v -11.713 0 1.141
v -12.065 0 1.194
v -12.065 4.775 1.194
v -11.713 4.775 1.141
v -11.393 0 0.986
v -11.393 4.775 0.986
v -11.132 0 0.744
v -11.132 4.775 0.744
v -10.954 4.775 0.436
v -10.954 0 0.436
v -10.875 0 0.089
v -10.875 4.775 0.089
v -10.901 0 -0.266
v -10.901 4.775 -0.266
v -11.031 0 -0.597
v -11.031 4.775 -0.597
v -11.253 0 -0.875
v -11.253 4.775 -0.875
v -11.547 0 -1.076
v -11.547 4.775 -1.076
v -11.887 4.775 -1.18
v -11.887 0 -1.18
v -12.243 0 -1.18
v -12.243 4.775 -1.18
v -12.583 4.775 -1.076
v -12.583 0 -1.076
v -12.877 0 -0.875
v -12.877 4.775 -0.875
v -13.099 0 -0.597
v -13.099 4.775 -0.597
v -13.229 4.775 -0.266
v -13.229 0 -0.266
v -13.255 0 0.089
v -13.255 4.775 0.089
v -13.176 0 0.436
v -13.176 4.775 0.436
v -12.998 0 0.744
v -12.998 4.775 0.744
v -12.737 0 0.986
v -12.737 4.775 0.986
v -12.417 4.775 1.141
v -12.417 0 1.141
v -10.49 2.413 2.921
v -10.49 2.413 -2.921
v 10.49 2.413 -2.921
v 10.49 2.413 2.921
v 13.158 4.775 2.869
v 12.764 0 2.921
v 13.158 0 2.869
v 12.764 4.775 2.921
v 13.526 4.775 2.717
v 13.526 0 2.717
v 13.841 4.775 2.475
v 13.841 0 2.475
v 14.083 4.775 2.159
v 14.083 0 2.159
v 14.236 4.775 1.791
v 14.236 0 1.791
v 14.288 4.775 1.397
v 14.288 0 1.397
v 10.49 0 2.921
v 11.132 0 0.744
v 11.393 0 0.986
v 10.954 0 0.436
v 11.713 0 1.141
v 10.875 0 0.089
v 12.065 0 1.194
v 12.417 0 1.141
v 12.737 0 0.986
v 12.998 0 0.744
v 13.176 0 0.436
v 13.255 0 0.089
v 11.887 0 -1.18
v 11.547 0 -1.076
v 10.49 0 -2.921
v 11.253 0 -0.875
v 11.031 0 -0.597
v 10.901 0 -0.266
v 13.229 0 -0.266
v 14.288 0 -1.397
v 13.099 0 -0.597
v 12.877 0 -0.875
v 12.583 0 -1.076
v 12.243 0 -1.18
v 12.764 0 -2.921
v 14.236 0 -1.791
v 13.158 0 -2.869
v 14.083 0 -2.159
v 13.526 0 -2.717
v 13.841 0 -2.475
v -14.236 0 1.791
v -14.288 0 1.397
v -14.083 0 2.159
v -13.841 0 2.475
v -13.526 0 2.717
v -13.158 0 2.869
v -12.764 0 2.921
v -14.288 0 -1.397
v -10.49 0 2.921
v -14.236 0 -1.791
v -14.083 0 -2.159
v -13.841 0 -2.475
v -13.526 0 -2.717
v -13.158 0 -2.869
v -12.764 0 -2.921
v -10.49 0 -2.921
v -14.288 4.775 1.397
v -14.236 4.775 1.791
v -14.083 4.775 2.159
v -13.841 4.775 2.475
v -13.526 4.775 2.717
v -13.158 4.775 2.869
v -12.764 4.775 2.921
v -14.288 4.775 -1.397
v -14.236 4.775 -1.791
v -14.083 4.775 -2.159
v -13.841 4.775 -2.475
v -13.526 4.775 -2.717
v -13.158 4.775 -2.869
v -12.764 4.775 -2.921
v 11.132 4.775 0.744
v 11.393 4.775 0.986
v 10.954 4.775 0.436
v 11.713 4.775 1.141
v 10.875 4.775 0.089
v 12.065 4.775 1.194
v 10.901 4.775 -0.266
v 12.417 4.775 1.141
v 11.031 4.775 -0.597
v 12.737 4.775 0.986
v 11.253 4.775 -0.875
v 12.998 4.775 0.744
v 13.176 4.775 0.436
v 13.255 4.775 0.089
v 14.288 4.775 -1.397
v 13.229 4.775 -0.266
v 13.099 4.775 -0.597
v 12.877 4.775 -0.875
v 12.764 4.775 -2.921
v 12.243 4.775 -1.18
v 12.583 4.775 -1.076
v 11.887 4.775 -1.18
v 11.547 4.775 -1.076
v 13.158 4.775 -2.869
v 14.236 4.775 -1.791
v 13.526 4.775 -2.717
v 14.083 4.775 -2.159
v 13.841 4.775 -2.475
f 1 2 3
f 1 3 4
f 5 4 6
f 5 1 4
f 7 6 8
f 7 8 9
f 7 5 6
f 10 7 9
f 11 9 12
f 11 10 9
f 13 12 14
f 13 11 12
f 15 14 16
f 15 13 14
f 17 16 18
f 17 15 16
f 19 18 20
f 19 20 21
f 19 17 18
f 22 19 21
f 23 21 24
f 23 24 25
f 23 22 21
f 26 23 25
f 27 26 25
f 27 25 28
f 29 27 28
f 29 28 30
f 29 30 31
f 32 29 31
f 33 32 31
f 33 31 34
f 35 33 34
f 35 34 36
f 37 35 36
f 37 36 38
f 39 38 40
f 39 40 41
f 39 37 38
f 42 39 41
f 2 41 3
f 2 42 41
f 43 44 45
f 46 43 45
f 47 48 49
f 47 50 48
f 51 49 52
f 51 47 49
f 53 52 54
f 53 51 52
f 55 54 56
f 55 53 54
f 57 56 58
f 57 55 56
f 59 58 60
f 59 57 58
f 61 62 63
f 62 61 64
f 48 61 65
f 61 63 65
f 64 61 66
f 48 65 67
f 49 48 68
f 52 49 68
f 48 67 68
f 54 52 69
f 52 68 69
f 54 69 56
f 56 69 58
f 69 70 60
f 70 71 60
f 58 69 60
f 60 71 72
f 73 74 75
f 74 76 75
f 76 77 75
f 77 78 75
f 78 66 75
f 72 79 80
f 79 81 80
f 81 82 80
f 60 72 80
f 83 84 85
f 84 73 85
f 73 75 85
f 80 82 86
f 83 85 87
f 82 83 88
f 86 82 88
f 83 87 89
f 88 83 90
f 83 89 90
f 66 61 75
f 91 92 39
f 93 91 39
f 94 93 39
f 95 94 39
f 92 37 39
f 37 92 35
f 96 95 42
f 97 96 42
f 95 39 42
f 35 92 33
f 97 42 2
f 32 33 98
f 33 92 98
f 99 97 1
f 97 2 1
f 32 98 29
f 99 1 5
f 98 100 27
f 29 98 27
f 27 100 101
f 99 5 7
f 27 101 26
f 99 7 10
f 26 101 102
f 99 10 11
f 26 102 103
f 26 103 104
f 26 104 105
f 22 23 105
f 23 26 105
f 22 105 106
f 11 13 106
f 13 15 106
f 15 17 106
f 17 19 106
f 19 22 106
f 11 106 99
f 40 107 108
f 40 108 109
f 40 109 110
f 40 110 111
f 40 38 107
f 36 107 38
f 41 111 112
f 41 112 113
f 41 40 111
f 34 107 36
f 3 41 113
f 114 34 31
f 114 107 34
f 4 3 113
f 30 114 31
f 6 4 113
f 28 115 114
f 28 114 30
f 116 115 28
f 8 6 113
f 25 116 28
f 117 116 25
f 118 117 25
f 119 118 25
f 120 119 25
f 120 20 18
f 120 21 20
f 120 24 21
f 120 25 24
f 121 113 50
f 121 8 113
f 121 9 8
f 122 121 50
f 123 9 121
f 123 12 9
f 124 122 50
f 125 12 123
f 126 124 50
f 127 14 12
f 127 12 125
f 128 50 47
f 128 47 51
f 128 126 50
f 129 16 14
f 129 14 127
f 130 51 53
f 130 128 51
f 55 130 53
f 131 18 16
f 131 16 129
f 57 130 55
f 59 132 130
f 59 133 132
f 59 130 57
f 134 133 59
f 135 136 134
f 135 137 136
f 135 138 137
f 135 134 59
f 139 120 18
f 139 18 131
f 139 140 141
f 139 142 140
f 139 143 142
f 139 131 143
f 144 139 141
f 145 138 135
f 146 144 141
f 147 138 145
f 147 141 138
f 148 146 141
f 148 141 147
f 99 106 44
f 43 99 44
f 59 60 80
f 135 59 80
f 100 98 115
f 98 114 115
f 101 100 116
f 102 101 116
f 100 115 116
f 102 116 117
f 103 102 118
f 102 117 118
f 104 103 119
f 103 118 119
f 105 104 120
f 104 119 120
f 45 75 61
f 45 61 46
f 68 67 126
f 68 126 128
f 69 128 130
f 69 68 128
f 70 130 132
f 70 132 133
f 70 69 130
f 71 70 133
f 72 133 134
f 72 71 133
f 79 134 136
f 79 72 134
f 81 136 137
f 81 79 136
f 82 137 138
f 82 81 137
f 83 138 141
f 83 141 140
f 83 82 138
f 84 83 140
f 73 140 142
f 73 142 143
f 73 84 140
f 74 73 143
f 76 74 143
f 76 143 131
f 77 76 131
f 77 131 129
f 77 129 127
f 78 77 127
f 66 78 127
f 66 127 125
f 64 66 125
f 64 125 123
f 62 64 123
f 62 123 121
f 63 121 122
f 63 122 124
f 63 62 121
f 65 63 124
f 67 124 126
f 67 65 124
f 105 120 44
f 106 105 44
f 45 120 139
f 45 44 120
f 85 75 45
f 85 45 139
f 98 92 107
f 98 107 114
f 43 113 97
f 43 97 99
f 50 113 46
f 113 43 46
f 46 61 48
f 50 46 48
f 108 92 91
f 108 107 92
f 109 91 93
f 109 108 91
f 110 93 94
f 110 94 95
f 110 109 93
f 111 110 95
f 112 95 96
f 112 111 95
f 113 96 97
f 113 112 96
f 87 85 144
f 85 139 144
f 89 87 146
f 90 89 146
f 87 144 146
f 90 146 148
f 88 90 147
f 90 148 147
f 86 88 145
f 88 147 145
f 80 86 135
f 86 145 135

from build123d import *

# Parameters (mm, degrees)
SKETCH1_W               = 28.575
SKETCH1_H               = 5.842
SKETCH1_R               = 1.1938
BOSS_EXTRUDE1_DEPTH     = 4.7752
FILLET1_R               = 1.524
CUT_EXTRUDE2_DEPTH      = 16.344948103
CUT_EXTRUDE2_DEPTH_BACK = 16.344948103
SKETCH3_W               = 20.9804
SKETCH3_H               = 2.413


with BuildPart() as part:
    # Sketch1 → Boss-Extrude1 (new body)
    with BuildSketch(Plane(origin=(0, 0, 0), x_dir=(1, 0, 0), z_dir=(0, 1, 0))):
        Rectangle(SKETCH1_W, SKETCH1_H)
        with Locations(Location((12.065, 0, 0), (0, 0, 270))):
            Circle(SKETCH1_R, mode=Mode.SUBTRACT)
        with Locations(Location((-12.065, 0, 0), (0, 0, 270))):
            Circle(SKETCH1_R, mode=Mode.SUBTRACT)
    extrude(amount=BOSS_EXTRUDE1_DEPTH)

    # Fillet1
    fillet1_edges = [part.edges().sort_by_distance(p)[0] for p in [
        (-14.2875, 2.3876, -2.921),
        (14.2875, 2.3876, -2.921),
        (14.2875, 2.3876, 2.921),
        (-14.2875, 2.3876, 2.921),
    ]]
    fillet(fillet1_edges, radius=FILLET1_R)

    # Sketch3 → Cut-Extrude2 (cut, two sides: drawn at the far end of the back side and taken through both)
    with BuildSketch(Plane.XY.offset(-CUT_EXTRUDE2_DEPTH_BACK)):
        with Locations((0, 1.2065)):
            Rectangle(SKETCH3_W, SKETCH3_H)
    extrude(amount=CUT_EXTRUDE2_DEPTH + CUT_EXTRUDE2_DEPTH_BACK, mode=Mode.SUBTRACT)


solid = part.part
